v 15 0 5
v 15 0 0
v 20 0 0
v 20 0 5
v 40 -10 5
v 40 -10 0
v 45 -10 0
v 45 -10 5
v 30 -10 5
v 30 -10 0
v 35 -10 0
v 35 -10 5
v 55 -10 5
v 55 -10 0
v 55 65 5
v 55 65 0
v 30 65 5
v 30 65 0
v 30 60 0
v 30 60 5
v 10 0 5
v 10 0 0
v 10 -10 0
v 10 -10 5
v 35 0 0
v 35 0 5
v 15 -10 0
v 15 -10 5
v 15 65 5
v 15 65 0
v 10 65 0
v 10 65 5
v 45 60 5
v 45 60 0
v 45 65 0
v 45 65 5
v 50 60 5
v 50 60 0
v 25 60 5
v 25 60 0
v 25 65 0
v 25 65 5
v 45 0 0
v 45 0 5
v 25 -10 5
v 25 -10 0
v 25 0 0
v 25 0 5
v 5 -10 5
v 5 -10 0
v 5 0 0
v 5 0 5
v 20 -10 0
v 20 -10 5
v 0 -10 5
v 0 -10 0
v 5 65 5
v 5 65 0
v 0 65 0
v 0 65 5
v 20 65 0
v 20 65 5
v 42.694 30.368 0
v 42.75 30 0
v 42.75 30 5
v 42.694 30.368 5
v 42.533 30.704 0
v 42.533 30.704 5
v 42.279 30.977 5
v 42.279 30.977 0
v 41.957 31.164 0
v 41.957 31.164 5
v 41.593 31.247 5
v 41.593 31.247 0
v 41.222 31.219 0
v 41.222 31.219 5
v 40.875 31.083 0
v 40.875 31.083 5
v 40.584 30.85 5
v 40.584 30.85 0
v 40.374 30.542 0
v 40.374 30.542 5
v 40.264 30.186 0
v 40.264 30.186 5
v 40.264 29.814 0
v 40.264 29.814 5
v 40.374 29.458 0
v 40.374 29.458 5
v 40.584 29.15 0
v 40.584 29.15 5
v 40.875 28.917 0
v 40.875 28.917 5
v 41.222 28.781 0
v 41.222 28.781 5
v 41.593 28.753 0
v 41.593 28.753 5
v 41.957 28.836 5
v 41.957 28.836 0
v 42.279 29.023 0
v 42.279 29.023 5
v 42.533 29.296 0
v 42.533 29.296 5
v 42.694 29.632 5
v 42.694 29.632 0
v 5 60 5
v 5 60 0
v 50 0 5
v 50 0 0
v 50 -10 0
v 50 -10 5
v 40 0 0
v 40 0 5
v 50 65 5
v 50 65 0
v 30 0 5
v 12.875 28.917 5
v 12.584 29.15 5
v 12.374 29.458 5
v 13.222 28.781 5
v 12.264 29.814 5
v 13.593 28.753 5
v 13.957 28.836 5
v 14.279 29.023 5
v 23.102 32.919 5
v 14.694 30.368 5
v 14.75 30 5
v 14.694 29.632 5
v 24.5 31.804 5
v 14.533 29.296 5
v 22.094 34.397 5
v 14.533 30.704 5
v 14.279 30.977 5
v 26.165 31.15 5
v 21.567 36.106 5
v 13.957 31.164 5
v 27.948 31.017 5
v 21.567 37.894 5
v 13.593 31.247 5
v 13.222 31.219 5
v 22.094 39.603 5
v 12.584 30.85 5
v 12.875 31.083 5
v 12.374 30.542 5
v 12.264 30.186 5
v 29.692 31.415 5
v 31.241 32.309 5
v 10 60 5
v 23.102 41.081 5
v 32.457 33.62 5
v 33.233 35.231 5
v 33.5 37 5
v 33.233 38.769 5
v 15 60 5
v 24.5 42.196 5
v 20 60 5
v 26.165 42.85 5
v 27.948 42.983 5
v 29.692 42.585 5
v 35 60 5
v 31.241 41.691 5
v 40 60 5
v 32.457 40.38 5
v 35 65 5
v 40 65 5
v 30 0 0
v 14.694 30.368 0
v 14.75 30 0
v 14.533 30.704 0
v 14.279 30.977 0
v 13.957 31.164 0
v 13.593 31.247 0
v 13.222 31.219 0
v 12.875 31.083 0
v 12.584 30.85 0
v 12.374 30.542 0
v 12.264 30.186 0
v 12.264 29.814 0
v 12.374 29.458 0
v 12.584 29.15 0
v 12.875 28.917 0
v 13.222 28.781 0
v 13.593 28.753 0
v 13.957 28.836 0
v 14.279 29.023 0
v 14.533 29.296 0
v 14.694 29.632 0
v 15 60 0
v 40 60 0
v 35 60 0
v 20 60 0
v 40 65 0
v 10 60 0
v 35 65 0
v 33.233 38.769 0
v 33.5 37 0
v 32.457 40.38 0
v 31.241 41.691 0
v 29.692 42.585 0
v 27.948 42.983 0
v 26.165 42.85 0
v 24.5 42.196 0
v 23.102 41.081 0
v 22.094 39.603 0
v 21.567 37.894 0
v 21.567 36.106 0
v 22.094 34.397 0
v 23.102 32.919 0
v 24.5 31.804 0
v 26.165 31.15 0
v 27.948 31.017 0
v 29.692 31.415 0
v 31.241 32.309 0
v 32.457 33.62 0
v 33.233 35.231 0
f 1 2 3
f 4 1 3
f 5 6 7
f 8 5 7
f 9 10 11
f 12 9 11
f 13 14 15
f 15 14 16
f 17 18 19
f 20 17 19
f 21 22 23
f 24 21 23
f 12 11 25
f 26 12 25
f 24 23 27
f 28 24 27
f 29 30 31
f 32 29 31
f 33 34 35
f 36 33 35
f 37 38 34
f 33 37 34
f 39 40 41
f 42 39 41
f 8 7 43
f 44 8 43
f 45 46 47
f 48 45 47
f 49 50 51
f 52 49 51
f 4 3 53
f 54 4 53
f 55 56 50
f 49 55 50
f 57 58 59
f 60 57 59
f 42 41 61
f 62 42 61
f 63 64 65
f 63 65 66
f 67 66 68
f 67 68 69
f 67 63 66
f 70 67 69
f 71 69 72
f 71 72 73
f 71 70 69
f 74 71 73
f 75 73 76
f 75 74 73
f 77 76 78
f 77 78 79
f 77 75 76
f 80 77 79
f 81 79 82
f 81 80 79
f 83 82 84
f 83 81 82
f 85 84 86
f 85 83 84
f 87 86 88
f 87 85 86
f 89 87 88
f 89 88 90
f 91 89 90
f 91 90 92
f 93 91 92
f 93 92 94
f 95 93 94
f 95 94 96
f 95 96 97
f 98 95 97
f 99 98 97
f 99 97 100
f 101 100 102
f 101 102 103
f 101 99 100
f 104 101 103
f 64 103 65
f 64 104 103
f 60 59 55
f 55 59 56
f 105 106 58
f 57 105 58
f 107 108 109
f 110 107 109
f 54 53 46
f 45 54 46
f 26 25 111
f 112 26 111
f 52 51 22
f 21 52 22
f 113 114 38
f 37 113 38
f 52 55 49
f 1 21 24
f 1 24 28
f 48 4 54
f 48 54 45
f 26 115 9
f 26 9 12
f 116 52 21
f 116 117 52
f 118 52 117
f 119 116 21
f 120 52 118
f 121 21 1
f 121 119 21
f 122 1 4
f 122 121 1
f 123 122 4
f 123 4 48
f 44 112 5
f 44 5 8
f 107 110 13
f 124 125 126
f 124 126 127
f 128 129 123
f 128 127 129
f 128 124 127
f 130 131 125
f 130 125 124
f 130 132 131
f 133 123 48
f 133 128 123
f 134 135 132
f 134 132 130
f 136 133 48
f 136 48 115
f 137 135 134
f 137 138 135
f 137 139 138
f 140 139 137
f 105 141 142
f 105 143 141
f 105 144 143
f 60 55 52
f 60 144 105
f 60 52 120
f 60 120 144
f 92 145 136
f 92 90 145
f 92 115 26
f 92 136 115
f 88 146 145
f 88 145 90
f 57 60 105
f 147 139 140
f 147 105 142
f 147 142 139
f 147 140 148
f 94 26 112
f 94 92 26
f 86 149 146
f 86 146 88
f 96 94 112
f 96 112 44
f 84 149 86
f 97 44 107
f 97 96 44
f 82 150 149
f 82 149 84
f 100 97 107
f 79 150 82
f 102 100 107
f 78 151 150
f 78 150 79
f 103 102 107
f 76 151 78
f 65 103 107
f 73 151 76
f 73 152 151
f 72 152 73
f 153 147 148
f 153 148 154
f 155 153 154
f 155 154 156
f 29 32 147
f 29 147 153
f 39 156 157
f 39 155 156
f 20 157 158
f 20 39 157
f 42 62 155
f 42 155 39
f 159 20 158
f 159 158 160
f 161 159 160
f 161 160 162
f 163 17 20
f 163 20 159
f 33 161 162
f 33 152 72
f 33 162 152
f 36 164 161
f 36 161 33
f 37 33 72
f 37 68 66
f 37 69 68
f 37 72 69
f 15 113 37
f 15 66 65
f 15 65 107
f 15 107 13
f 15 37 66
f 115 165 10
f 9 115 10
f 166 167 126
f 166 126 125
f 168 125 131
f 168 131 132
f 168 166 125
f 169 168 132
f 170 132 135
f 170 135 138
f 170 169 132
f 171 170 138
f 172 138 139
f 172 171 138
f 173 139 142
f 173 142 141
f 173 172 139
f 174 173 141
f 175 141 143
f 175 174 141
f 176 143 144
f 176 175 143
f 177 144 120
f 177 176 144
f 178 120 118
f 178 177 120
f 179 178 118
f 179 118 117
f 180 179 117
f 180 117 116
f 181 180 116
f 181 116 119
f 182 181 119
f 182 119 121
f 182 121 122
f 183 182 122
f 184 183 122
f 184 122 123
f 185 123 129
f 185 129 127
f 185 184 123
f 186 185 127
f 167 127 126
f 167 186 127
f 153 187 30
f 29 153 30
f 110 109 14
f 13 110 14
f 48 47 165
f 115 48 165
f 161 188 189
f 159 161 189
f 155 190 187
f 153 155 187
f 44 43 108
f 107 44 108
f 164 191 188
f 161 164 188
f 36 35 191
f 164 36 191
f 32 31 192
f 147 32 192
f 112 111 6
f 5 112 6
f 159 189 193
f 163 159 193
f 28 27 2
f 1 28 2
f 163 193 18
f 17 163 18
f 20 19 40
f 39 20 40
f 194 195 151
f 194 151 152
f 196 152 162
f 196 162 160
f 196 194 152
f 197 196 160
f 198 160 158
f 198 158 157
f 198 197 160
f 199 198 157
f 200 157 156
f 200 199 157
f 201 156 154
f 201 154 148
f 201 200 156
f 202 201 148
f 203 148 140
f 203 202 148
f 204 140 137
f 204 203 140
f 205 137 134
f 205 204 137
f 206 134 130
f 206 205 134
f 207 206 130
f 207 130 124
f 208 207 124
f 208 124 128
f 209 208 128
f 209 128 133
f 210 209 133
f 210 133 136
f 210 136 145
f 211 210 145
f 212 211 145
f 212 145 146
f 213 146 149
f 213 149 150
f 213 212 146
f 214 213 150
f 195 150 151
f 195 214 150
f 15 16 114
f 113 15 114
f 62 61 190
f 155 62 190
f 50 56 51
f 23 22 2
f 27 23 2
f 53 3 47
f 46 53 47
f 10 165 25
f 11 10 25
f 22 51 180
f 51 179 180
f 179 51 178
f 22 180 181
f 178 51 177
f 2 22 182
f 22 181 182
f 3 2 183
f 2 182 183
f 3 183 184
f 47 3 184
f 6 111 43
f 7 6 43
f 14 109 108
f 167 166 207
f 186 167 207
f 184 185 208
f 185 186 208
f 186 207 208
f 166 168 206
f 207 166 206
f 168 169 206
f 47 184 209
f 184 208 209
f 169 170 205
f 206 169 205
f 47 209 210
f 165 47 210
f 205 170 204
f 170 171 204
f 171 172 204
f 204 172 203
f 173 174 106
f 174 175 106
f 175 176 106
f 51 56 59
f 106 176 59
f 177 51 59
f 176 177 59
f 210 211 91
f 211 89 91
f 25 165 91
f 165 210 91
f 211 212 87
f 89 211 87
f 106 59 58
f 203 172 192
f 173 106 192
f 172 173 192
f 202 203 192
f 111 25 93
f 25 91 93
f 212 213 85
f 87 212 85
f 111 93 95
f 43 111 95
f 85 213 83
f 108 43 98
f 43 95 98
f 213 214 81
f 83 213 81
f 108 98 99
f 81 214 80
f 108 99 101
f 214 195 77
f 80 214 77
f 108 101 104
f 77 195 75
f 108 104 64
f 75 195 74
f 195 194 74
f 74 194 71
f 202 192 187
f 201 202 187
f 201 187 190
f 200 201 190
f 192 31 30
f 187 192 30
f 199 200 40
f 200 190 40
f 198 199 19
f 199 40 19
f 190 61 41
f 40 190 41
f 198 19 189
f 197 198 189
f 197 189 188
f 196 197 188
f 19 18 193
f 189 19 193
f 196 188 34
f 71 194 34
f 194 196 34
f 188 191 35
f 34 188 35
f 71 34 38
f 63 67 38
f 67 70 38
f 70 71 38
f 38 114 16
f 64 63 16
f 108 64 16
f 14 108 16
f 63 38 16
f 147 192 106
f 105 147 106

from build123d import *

# Parameters (mm, degrees)
ESQUISSE1_R        = 1.25
ESQUISSE1_R_2      = 6
BOSS_EXTRU_1_DEPTH = 5


with BuildPart() as part:
    # Esquisse1 → Boss.-Extru.1 (new body)
    with BuildSketch(Plane.XY):
        Polygon((15, 65), (10, 65), (10, 60), (5, 60), (5, 65), (0, 65), (0, -10), (5, -10), (5, 0), (10, 0), (10, -10), (15, -10), (15, 0), (20, 0), (20, -10), (25, -10), (25, 0), (30, 0), (30, -10), (35, -10), (35, 0), (40, 0), (40, -10), (45, -10), (45, 0), (50, 0), (50, -10), (55, -10), (55, 65), (50, 65), (50, 60), (45, 60), (45, 65), (40, 65), (40, 60), (35, 60), (35, 65), (30, 65), (30, 60), (25, 60), (25, 65), (20, 65), (20, 60), (15, 60), align=None)
        with Locations((41.5, 30)):
            Circle(ESQUISSE1_R, mode=Mode.SUBTRACT)
        with Locations((13.5, 30)):
            Circle(ESQUISSE1_R, mode=Mode.SUBTRACT)
        with Locations((27.5, 37)):
            Circle(ESQUISSE1_R_2, mode=Mode.SUBTRACT)
    extrude(amount=BOSS_EXTRU_1_DEPTH)


solid = part.part
